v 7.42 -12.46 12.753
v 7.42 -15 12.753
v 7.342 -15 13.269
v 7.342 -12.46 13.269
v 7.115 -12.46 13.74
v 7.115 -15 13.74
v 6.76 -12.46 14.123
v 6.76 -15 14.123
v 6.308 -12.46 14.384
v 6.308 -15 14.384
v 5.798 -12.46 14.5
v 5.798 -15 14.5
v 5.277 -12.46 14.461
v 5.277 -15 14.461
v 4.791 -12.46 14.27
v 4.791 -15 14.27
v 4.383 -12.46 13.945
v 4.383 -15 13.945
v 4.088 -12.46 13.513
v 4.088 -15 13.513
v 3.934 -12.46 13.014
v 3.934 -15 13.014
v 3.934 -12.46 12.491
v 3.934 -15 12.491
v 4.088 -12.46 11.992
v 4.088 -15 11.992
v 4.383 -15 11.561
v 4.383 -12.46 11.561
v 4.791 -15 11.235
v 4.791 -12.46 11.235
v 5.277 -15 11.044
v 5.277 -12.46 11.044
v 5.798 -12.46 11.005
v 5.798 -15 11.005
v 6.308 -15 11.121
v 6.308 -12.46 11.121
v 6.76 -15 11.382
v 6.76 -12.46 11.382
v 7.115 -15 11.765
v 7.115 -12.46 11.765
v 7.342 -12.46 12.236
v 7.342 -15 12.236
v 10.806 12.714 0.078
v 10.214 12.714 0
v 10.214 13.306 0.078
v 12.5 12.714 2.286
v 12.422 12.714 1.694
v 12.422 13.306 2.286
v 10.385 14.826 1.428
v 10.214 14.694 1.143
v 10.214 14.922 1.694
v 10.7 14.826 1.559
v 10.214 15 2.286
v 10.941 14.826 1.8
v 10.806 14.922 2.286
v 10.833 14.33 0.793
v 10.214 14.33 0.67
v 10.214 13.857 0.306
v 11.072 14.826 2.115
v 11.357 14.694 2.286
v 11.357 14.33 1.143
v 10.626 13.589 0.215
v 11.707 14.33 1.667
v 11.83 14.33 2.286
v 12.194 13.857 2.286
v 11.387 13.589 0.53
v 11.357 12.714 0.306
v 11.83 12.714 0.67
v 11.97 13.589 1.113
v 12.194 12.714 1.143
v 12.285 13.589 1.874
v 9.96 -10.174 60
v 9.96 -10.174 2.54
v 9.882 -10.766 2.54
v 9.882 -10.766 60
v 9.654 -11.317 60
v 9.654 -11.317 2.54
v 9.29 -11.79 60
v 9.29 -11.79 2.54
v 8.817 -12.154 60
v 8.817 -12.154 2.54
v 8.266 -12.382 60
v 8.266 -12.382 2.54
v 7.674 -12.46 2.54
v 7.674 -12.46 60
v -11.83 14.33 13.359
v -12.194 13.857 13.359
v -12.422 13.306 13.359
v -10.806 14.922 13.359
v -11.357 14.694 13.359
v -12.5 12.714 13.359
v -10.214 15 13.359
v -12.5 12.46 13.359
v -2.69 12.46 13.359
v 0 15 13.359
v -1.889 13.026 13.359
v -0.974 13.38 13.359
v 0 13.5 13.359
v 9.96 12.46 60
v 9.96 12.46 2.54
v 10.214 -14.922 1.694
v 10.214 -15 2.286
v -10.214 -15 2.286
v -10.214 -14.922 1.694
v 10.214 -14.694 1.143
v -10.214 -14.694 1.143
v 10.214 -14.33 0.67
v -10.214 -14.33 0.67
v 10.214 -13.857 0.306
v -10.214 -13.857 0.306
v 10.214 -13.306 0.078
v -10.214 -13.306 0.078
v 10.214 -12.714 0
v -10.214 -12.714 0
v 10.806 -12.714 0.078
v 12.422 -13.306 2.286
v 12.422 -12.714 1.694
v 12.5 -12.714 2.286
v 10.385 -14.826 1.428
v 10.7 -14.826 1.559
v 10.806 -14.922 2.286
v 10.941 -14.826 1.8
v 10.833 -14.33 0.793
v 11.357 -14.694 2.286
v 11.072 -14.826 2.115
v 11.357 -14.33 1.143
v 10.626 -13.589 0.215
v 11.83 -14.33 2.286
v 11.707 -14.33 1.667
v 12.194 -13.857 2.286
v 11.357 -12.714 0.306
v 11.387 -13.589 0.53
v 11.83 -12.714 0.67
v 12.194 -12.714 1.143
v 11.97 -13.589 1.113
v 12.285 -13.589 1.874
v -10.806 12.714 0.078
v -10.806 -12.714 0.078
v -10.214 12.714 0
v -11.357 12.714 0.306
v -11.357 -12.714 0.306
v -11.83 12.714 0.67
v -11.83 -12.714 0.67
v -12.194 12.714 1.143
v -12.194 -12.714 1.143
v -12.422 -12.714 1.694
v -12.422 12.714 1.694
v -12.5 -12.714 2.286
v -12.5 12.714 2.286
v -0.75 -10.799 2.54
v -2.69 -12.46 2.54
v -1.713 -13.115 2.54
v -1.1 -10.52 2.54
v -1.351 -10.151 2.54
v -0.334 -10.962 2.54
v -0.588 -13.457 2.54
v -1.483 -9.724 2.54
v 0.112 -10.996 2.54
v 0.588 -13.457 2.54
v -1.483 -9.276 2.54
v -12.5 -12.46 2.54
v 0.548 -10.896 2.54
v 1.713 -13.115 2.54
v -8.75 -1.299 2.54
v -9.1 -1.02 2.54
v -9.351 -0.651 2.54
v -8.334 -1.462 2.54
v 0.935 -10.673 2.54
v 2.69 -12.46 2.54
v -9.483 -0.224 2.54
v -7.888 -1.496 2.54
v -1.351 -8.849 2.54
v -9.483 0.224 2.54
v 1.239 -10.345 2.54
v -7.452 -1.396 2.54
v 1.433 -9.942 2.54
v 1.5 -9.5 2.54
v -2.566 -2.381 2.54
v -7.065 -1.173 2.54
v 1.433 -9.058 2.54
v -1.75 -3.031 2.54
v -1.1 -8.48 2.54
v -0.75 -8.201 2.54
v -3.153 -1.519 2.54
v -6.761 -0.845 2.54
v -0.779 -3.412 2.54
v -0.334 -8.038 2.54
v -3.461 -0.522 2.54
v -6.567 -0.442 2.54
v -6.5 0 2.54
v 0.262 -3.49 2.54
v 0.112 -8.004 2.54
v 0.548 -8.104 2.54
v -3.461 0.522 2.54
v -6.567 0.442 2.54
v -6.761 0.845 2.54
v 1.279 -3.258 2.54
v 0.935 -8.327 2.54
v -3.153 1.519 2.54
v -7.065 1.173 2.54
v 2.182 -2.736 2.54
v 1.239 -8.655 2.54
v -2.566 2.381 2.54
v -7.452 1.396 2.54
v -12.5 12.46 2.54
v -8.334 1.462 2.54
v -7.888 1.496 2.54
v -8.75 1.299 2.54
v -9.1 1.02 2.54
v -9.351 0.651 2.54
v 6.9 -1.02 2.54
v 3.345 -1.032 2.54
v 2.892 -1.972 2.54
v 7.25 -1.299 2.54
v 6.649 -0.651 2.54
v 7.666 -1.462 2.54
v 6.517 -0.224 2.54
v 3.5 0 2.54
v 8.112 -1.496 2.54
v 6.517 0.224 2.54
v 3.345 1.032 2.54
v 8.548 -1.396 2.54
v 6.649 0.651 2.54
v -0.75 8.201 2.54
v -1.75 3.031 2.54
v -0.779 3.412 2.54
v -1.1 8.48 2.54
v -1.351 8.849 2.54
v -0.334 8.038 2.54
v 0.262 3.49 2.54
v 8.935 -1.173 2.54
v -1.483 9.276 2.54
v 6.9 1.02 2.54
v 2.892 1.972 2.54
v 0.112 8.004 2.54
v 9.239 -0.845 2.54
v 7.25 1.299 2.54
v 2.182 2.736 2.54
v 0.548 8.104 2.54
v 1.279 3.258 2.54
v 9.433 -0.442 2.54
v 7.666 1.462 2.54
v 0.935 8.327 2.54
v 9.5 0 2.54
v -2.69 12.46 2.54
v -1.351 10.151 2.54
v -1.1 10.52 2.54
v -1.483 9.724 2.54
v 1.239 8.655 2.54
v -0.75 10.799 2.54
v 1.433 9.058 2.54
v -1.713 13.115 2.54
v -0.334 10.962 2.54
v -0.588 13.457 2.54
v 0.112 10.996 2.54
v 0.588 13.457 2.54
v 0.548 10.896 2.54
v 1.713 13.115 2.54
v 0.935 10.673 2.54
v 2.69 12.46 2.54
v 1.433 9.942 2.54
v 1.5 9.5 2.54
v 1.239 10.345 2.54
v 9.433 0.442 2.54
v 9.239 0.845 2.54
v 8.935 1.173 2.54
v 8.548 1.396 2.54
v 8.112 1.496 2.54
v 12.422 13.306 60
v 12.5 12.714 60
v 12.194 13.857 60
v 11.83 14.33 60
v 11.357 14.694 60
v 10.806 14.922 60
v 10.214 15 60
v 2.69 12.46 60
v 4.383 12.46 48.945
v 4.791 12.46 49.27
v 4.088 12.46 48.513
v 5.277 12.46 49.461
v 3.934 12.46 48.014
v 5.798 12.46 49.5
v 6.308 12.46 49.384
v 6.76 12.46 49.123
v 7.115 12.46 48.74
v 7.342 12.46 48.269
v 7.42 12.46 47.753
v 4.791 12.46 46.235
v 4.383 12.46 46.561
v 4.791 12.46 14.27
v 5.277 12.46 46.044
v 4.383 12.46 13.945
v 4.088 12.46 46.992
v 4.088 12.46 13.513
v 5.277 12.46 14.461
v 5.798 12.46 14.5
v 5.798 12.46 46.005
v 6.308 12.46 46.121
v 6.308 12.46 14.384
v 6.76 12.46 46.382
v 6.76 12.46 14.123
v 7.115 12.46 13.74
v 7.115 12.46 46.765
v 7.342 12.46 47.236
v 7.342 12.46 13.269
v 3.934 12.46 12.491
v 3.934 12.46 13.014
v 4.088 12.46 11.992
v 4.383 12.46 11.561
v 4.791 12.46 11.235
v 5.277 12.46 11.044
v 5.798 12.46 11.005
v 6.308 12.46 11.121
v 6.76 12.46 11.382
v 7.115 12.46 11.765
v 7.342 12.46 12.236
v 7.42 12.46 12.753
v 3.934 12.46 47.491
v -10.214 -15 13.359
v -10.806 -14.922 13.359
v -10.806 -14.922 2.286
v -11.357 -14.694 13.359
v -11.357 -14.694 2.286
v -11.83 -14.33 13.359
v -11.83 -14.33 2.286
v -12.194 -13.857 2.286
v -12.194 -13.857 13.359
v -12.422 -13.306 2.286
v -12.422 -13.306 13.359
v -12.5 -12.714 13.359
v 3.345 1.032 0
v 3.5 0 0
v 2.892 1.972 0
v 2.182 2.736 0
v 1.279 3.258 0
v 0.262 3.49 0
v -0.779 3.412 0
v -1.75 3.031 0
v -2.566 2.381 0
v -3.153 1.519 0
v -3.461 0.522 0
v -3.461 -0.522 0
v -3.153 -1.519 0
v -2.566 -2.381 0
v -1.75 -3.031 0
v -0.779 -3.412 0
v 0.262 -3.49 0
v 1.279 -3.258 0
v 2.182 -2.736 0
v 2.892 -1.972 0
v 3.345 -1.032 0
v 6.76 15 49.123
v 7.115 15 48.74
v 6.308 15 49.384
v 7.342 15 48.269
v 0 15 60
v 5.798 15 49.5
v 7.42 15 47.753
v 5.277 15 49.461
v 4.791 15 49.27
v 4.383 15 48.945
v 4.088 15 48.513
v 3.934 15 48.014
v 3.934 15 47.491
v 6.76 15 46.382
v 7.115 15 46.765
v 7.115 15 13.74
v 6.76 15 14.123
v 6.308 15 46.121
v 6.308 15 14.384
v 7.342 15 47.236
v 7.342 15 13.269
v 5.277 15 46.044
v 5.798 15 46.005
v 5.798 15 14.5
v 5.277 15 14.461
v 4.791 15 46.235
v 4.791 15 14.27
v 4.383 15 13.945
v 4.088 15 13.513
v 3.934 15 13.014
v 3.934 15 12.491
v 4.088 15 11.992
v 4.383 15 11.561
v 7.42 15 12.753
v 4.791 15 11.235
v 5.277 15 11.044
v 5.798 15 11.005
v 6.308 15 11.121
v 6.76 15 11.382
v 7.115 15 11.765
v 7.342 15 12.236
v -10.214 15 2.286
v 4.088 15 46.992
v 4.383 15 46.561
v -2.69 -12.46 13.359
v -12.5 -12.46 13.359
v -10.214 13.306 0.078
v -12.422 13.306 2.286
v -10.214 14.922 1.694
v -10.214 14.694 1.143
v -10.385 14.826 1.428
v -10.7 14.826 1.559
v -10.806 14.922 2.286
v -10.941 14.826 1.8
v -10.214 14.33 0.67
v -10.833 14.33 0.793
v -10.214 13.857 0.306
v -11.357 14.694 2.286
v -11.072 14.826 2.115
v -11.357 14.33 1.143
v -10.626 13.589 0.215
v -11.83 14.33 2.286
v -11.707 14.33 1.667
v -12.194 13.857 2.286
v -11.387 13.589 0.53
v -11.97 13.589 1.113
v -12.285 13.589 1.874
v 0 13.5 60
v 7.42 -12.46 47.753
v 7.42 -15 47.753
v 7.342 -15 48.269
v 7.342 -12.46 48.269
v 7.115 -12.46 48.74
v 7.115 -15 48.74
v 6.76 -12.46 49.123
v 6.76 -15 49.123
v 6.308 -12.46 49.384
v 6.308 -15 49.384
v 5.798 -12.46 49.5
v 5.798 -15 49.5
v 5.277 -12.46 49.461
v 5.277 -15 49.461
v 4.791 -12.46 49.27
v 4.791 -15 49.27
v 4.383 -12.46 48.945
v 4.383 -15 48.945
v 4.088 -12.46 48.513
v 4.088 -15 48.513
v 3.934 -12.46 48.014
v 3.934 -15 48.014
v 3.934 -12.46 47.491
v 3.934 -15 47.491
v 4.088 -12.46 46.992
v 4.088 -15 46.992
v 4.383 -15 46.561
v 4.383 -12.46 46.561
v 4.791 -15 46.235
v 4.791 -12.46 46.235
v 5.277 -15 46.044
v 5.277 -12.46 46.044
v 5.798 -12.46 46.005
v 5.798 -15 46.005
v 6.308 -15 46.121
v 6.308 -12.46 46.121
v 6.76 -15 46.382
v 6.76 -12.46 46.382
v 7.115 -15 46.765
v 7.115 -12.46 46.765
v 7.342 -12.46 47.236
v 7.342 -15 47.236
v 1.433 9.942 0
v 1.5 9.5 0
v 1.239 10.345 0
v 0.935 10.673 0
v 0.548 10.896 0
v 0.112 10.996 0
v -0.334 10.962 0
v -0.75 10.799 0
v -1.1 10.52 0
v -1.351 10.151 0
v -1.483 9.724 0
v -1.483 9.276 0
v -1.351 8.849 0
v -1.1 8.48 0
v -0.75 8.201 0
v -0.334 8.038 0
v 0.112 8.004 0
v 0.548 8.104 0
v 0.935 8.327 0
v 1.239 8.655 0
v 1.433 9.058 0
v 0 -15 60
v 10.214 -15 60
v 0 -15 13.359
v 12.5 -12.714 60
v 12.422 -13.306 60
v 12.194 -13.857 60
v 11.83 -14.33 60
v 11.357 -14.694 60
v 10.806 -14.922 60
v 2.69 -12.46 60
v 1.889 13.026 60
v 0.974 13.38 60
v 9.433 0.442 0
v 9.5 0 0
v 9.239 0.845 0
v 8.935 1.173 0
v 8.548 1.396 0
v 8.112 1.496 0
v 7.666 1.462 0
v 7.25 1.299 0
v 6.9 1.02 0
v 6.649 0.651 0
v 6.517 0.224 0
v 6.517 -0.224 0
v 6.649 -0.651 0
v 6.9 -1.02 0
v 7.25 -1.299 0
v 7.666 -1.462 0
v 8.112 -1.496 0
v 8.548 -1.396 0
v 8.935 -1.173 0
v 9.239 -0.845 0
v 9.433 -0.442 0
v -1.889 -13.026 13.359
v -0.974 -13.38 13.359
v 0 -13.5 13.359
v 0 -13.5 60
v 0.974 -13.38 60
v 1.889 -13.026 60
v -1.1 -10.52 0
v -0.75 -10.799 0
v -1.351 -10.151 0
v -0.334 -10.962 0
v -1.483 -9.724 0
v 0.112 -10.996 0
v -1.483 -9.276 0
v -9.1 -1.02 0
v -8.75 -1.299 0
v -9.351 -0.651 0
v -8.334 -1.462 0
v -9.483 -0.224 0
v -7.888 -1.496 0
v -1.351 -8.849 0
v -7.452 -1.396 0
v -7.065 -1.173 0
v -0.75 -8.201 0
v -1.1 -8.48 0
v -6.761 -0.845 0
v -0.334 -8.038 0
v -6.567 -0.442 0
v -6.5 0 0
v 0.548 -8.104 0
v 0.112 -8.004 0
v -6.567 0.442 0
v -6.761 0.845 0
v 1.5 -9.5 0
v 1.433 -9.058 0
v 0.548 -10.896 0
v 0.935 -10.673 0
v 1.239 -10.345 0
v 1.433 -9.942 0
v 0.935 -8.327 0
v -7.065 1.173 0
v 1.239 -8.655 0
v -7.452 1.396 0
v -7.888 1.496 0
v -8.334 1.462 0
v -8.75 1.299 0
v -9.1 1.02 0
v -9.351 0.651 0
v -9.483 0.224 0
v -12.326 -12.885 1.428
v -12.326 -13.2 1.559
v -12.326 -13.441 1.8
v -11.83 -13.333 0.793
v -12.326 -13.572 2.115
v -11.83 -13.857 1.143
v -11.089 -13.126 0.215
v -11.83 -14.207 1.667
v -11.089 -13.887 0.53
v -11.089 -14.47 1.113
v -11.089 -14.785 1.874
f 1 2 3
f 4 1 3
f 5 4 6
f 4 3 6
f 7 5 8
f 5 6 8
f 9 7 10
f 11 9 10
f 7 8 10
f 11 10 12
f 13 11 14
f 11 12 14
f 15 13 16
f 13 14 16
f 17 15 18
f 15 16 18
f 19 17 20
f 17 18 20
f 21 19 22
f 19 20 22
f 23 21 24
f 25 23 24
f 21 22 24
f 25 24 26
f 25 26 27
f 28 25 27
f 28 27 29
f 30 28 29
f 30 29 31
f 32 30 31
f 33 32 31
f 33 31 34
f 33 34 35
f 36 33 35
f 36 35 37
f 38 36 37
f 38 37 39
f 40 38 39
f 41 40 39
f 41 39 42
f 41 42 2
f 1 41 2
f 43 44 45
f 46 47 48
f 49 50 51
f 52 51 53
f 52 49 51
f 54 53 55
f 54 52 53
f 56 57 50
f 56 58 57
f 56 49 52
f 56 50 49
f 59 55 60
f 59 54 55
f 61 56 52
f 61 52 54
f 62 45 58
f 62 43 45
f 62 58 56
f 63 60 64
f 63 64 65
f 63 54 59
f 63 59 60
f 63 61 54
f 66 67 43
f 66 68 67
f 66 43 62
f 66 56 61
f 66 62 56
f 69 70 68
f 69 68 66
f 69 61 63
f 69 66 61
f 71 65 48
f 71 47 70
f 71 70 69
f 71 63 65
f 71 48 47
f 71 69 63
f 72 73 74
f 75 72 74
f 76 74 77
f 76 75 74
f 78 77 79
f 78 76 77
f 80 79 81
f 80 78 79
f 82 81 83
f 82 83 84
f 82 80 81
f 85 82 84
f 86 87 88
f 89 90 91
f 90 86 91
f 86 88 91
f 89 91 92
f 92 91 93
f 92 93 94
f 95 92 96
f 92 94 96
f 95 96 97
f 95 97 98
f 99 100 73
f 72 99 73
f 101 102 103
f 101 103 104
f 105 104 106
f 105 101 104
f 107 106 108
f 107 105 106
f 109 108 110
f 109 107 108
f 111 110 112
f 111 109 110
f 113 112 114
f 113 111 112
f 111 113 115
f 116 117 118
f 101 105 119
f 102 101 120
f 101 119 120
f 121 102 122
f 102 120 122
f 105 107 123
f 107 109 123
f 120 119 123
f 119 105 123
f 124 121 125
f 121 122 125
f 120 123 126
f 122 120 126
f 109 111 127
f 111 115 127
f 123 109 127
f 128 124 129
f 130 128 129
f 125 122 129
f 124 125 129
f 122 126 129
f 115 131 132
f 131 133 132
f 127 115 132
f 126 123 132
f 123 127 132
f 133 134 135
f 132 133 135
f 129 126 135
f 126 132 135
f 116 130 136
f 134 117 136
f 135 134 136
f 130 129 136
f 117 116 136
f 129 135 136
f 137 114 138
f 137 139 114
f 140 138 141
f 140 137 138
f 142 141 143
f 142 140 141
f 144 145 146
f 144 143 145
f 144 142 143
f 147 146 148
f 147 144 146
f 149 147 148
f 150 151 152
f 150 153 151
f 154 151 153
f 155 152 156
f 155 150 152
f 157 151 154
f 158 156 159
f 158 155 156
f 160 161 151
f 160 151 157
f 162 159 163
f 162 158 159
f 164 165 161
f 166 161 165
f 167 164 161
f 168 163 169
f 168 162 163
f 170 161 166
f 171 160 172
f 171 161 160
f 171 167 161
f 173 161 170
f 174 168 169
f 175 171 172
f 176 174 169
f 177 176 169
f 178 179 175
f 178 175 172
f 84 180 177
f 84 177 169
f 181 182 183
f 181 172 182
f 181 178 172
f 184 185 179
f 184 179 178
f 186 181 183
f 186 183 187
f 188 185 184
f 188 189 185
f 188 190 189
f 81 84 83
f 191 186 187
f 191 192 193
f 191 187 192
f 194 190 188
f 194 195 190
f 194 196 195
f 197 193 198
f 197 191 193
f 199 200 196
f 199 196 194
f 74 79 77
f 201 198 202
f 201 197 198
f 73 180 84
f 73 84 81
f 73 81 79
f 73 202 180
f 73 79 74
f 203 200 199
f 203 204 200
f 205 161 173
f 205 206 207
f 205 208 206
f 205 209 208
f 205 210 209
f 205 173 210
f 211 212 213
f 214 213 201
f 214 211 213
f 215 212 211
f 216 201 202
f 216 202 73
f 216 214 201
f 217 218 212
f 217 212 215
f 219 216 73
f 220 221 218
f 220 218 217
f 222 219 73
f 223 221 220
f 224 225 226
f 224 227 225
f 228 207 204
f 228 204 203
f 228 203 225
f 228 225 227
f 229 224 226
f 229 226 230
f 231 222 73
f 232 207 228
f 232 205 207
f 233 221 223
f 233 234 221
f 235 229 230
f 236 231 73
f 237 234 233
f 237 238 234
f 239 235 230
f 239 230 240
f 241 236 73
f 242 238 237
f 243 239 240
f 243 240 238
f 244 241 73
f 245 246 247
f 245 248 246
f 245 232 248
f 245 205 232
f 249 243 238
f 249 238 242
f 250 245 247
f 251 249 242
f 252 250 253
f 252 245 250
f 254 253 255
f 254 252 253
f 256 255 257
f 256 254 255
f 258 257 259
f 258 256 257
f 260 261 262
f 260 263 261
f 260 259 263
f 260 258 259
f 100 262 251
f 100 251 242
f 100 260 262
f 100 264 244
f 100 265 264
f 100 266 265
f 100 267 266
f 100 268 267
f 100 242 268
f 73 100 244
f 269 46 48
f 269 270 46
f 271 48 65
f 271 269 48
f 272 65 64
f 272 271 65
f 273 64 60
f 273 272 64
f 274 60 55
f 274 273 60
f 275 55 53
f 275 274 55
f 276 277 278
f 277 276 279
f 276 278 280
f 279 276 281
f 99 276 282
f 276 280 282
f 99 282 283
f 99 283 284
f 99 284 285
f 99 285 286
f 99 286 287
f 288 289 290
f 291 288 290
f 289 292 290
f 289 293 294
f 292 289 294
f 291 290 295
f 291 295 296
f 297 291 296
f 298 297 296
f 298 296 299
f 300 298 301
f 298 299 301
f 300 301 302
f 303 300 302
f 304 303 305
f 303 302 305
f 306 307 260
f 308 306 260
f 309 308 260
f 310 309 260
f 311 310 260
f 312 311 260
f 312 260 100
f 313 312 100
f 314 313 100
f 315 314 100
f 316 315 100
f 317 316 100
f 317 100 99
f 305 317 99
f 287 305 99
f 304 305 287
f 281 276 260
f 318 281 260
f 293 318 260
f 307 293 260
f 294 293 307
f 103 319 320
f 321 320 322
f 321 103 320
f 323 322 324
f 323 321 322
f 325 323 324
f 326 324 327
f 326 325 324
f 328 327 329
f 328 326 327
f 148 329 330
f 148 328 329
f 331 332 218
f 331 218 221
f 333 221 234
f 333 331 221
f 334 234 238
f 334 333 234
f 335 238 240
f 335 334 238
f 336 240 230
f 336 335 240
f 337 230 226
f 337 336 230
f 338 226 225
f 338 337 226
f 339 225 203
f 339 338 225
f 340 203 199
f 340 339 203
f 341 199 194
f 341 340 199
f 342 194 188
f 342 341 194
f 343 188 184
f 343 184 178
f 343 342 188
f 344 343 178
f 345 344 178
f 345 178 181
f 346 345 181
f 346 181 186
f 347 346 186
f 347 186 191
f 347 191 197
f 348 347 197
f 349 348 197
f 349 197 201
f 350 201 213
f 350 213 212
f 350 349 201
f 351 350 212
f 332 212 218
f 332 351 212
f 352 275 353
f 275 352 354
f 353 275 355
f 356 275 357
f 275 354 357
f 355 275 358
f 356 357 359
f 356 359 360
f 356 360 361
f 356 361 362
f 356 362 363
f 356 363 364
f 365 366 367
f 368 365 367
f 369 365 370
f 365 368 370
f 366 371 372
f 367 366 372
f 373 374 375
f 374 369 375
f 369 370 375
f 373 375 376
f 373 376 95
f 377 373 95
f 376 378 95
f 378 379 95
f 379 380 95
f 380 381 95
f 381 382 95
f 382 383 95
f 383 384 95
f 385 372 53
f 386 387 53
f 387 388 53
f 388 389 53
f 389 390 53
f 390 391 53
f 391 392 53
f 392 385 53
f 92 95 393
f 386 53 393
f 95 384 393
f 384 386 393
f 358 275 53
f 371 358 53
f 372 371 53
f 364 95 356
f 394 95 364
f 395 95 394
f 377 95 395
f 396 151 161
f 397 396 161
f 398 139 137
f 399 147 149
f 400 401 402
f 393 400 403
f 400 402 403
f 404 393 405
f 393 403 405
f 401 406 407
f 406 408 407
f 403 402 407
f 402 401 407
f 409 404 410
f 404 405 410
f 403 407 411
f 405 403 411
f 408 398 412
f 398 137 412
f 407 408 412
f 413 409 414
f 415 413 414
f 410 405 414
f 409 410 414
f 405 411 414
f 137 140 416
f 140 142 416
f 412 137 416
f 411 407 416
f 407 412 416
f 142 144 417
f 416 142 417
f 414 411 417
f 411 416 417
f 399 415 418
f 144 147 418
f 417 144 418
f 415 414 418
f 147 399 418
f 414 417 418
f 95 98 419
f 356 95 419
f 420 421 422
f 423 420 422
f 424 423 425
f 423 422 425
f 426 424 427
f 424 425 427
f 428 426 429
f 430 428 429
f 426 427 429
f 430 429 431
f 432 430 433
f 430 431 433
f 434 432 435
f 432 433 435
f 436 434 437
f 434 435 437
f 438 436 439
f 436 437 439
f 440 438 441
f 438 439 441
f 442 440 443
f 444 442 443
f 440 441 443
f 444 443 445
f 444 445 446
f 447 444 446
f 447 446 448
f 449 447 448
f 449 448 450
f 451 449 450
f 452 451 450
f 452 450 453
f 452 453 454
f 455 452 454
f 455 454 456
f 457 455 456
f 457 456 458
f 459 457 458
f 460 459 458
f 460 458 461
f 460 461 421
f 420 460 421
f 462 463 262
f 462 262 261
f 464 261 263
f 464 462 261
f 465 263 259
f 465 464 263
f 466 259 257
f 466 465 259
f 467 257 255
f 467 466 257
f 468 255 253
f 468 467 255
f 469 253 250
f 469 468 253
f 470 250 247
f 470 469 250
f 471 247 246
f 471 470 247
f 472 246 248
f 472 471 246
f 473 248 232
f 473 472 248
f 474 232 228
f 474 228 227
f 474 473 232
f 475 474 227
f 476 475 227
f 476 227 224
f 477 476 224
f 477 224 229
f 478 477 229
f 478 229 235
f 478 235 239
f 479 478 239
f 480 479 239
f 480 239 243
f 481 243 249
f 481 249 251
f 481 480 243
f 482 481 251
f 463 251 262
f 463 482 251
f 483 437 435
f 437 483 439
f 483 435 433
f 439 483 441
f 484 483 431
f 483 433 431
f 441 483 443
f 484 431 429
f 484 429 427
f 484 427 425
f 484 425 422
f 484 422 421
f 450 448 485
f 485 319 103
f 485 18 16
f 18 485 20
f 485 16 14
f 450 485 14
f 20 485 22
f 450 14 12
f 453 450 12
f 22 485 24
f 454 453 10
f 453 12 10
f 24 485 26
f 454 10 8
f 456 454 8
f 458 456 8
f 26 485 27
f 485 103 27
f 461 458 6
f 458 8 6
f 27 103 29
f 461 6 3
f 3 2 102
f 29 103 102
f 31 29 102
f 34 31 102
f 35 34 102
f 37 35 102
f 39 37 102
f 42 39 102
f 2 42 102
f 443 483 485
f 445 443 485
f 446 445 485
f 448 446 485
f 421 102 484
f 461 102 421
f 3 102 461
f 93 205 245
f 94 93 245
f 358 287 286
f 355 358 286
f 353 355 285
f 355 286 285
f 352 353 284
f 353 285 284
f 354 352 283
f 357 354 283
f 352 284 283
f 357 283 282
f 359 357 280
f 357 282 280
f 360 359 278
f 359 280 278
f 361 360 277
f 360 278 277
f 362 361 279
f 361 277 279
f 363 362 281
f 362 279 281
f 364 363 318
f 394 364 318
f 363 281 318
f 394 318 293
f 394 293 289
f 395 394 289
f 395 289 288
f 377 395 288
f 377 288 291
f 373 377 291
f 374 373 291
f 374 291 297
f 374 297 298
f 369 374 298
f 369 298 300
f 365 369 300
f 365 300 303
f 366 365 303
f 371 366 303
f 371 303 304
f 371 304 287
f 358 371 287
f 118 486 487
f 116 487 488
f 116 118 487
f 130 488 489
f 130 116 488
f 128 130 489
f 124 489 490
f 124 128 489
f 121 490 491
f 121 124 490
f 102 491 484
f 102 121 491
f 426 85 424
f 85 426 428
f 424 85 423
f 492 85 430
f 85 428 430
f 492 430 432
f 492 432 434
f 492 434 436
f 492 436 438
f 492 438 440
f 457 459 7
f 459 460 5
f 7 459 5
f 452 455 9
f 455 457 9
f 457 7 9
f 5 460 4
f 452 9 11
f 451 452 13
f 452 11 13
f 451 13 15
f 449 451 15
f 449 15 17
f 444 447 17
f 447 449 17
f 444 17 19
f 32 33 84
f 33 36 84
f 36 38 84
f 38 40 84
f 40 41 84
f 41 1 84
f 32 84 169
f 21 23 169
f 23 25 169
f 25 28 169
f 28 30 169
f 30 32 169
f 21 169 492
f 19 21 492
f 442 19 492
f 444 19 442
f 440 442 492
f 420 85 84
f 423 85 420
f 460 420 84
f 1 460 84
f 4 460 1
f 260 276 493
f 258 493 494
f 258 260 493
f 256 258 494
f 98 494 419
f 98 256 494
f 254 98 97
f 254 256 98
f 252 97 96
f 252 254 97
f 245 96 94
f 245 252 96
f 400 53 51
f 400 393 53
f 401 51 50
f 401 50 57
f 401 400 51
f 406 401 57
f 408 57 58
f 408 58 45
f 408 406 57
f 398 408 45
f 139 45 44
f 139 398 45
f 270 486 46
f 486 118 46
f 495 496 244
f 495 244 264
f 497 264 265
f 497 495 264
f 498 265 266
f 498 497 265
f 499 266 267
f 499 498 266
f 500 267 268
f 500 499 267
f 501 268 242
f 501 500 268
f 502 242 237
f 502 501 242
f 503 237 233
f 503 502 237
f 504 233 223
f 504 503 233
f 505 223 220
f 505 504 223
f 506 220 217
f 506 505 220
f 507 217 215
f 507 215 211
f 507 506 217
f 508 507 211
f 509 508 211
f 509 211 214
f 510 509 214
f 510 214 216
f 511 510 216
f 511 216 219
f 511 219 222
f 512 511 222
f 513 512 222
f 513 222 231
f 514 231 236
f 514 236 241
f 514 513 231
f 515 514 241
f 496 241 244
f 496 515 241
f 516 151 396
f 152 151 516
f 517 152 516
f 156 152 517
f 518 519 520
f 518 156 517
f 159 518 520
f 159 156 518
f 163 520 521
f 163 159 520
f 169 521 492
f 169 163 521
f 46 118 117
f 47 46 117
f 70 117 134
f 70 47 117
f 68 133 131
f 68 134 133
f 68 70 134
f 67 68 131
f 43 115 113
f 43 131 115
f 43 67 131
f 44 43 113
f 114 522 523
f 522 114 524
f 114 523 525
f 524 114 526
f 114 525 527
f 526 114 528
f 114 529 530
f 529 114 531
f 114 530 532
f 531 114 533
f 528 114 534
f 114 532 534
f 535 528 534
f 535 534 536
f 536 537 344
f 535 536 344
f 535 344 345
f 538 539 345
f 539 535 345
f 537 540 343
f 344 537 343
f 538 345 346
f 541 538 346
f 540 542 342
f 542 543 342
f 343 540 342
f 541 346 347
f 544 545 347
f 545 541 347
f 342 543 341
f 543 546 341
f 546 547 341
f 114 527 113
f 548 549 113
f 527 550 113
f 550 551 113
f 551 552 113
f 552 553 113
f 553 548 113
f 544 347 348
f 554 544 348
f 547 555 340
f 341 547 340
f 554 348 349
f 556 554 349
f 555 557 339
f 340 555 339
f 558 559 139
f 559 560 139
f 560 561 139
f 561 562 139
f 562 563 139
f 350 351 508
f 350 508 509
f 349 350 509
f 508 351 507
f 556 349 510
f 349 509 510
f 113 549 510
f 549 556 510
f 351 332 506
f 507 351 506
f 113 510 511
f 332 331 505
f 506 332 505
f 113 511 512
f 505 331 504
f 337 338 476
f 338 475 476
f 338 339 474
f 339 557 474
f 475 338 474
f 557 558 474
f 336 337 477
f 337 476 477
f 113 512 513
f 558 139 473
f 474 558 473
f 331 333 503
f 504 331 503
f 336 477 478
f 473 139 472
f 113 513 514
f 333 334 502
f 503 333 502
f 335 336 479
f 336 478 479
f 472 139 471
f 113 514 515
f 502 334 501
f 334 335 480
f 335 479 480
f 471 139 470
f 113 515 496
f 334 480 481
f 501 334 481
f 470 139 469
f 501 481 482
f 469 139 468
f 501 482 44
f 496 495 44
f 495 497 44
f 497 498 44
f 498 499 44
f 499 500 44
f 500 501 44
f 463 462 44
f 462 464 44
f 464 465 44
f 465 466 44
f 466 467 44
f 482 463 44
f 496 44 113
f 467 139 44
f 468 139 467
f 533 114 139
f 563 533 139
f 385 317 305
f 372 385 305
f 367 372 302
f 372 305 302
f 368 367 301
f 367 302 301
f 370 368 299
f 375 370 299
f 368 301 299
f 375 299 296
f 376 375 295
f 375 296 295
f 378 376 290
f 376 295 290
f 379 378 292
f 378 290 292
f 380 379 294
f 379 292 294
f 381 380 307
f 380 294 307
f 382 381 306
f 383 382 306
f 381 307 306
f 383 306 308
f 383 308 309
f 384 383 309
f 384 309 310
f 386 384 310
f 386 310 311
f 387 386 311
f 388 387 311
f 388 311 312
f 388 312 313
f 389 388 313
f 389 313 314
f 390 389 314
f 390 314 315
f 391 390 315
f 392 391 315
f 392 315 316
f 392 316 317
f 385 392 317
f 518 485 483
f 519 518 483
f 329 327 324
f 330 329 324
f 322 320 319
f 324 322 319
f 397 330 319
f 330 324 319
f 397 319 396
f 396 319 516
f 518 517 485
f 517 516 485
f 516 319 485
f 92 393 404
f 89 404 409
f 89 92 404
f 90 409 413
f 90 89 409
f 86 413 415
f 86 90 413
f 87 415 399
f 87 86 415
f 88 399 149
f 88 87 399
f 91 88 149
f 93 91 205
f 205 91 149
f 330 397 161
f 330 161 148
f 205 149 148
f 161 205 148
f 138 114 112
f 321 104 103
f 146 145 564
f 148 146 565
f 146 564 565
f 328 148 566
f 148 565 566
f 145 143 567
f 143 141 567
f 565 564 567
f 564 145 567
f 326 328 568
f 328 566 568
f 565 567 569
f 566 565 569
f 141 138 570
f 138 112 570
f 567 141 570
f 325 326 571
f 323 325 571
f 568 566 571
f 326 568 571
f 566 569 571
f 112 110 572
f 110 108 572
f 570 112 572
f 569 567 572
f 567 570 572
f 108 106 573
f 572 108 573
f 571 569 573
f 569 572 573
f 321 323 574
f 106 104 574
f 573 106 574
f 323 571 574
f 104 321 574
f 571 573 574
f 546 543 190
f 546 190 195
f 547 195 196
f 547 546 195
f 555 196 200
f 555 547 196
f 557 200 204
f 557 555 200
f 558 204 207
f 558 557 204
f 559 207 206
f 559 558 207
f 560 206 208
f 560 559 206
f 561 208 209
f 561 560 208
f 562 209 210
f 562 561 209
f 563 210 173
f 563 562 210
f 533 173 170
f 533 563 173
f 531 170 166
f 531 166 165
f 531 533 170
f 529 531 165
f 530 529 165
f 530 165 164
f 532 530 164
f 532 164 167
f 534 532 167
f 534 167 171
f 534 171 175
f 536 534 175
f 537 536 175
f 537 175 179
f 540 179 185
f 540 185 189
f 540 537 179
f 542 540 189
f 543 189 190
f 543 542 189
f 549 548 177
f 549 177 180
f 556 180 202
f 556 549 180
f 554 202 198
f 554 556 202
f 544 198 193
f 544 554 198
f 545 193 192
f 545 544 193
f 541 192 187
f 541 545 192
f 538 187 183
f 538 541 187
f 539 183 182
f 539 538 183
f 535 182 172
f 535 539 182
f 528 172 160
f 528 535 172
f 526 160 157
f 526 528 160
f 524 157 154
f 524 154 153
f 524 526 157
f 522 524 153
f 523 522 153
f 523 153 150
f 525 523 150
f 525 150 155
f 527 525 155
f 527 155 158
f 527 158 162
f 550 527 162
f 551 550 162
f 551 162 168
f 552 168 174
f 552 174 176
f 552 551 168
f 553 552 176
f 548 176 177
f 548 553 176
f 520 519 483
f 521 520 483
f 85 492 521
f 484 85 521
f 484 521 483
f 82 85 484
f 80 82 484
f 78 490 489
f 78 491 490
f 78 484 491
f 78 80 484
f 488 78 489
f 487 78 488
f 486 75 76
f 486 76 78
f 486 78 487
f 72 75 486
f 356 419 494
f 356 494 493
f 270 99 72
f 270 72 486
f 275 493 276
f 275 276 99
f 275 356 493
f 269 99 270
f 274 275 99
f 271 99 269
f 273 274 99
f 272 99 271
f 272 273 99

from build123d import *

# Parameters (mm, degrees)
F0_W     = 19.92
F0_H     = 24.92
F0_R     = 1.5
F0_R_2   = 3.5
F0_W_2   = 2.54
F1_DEPTH = 2.54
F2_DEPTH = 60
F3_R     = 1.7526
F4_DEPTH = 34.544
F5_R     = 2.286
F7_DEPTH = 61.8236
F8_W     = 10.214
F8_H     = 46.6414740682
F9_DEPTH = 44.958


with BuildPart() as f1:
    # F0 (on Top) → F1 (new body)
    with BuildSketch(Plane.XY):
        Polygon((12.5, -15), (12.5, 15), (-12.5, 15), (-12.5, 12.46), (-9.96, 12.46), (9.96, 12.46), (9.96, -12.46), (-9.96, -12.46), (-12.5, -12.46), (-12.5, -15), align=None)
        Rectangle(F0_W, F0_H)
        with Locations((0, -9.5)):
            Circle(F0_R, mode=Mode.SUBTRACT)
        with Locations((-8, 0)):
            Circle(F0_R, mode=Mode.SUBTRACT)
        Circle(F0_R_2, mode=Mode.SUBTRACT)
        with Locations((8, 0)):
            Circle(F0_R, mode=Mode.SUBTRACT)
        with Locations((0, 9.5)):
            Circle(F0_R, mode=Mode.SUBTRACT)
        with Locations((-11.23, 0)):
            Rectangle(F0_W_2, F0_H)
    extrude(amount=F1_DEPTH)

    # F0 (on Top) → F2 (join)
    with BuildSketch(Plane.XY):
        Polygon((12.5, -15), (12.5, 15), (-12.5, 15), (-12.5, 12.46), (-9.96, 12.46), (9.96, 12.46), (9.96, -12.46), (-9.96, -12.46), (-12.5, -12.46), (-12.5, -15), align=None)
    extrude(amount=F2_DEPTH)

    # F3 (on face) → F4 (cut)
    with BuildSketch(Plane.XZ.offset(15)):
        with Locations((5.6674, 12.7526)):
            Circle(F3_R)
        with Locations((5.6674, 47.7526)):
            Circle(F3_R)
    extrude(amount=-F4_DEPTH, mode=Mode.SUBTRACT)

    # F5
    f5_edges = [f1.edges().sort_by_distance(p)[0] for p in [
        (12.5, 0, 0),
        (0, -15, 0),
        (-12.5, 0, 0),
        (0, 15, 0),
        (-12.5, -15, 30),
        (12.5, -15, 30),
        (12.5, 15, 30),
        (-12.5, 15, 30),
        (9.96, -12.46, 31.27),
    ]]
    fillet(f5_edges, radius=F5_R)

    # F6 (on face) → F7 (cut)
    with BuildSketch(Plane.XY.offset(2.54)):
        with BuildLine():
            Line((-2.6904274753, 12.46), (2.6904274753, 12.46))
            ThreePointArc((2.6904274753, 12.46), (0, 13.5), (-2.6904274753, 12.46))
        make_face()
        with BuildLine():
            Line((2.6904274753, -12.46), (-2.6904274753, -12.46))
            ThreePointArc((-2.6904274753, -12.46), (0, -13.5), (2.6904274753, -12.46))
        make_face()
    extrude(amount=F7_DEPTH, mode=Mode.SUBTRACT)

    # F8 (on face) → F9 (cut)
    with BuildSketch(Plane.XZ.offset(15)):
        Polygon((0, 64.0577673912), (-17.1696953475, 64.0577673912), (-17.1696953475, 13.3585259318), (-10.214, 13.3585259318), (-10.214, 60), (0, 60), align=None)
        with Locations((-5.107, 36.6792629659)):
            Rectangle(F8_W, F8_H)
    extrude(amount=-F9_DEPTH, mode=Mode.SUBTRACT)


solid = f1.part
